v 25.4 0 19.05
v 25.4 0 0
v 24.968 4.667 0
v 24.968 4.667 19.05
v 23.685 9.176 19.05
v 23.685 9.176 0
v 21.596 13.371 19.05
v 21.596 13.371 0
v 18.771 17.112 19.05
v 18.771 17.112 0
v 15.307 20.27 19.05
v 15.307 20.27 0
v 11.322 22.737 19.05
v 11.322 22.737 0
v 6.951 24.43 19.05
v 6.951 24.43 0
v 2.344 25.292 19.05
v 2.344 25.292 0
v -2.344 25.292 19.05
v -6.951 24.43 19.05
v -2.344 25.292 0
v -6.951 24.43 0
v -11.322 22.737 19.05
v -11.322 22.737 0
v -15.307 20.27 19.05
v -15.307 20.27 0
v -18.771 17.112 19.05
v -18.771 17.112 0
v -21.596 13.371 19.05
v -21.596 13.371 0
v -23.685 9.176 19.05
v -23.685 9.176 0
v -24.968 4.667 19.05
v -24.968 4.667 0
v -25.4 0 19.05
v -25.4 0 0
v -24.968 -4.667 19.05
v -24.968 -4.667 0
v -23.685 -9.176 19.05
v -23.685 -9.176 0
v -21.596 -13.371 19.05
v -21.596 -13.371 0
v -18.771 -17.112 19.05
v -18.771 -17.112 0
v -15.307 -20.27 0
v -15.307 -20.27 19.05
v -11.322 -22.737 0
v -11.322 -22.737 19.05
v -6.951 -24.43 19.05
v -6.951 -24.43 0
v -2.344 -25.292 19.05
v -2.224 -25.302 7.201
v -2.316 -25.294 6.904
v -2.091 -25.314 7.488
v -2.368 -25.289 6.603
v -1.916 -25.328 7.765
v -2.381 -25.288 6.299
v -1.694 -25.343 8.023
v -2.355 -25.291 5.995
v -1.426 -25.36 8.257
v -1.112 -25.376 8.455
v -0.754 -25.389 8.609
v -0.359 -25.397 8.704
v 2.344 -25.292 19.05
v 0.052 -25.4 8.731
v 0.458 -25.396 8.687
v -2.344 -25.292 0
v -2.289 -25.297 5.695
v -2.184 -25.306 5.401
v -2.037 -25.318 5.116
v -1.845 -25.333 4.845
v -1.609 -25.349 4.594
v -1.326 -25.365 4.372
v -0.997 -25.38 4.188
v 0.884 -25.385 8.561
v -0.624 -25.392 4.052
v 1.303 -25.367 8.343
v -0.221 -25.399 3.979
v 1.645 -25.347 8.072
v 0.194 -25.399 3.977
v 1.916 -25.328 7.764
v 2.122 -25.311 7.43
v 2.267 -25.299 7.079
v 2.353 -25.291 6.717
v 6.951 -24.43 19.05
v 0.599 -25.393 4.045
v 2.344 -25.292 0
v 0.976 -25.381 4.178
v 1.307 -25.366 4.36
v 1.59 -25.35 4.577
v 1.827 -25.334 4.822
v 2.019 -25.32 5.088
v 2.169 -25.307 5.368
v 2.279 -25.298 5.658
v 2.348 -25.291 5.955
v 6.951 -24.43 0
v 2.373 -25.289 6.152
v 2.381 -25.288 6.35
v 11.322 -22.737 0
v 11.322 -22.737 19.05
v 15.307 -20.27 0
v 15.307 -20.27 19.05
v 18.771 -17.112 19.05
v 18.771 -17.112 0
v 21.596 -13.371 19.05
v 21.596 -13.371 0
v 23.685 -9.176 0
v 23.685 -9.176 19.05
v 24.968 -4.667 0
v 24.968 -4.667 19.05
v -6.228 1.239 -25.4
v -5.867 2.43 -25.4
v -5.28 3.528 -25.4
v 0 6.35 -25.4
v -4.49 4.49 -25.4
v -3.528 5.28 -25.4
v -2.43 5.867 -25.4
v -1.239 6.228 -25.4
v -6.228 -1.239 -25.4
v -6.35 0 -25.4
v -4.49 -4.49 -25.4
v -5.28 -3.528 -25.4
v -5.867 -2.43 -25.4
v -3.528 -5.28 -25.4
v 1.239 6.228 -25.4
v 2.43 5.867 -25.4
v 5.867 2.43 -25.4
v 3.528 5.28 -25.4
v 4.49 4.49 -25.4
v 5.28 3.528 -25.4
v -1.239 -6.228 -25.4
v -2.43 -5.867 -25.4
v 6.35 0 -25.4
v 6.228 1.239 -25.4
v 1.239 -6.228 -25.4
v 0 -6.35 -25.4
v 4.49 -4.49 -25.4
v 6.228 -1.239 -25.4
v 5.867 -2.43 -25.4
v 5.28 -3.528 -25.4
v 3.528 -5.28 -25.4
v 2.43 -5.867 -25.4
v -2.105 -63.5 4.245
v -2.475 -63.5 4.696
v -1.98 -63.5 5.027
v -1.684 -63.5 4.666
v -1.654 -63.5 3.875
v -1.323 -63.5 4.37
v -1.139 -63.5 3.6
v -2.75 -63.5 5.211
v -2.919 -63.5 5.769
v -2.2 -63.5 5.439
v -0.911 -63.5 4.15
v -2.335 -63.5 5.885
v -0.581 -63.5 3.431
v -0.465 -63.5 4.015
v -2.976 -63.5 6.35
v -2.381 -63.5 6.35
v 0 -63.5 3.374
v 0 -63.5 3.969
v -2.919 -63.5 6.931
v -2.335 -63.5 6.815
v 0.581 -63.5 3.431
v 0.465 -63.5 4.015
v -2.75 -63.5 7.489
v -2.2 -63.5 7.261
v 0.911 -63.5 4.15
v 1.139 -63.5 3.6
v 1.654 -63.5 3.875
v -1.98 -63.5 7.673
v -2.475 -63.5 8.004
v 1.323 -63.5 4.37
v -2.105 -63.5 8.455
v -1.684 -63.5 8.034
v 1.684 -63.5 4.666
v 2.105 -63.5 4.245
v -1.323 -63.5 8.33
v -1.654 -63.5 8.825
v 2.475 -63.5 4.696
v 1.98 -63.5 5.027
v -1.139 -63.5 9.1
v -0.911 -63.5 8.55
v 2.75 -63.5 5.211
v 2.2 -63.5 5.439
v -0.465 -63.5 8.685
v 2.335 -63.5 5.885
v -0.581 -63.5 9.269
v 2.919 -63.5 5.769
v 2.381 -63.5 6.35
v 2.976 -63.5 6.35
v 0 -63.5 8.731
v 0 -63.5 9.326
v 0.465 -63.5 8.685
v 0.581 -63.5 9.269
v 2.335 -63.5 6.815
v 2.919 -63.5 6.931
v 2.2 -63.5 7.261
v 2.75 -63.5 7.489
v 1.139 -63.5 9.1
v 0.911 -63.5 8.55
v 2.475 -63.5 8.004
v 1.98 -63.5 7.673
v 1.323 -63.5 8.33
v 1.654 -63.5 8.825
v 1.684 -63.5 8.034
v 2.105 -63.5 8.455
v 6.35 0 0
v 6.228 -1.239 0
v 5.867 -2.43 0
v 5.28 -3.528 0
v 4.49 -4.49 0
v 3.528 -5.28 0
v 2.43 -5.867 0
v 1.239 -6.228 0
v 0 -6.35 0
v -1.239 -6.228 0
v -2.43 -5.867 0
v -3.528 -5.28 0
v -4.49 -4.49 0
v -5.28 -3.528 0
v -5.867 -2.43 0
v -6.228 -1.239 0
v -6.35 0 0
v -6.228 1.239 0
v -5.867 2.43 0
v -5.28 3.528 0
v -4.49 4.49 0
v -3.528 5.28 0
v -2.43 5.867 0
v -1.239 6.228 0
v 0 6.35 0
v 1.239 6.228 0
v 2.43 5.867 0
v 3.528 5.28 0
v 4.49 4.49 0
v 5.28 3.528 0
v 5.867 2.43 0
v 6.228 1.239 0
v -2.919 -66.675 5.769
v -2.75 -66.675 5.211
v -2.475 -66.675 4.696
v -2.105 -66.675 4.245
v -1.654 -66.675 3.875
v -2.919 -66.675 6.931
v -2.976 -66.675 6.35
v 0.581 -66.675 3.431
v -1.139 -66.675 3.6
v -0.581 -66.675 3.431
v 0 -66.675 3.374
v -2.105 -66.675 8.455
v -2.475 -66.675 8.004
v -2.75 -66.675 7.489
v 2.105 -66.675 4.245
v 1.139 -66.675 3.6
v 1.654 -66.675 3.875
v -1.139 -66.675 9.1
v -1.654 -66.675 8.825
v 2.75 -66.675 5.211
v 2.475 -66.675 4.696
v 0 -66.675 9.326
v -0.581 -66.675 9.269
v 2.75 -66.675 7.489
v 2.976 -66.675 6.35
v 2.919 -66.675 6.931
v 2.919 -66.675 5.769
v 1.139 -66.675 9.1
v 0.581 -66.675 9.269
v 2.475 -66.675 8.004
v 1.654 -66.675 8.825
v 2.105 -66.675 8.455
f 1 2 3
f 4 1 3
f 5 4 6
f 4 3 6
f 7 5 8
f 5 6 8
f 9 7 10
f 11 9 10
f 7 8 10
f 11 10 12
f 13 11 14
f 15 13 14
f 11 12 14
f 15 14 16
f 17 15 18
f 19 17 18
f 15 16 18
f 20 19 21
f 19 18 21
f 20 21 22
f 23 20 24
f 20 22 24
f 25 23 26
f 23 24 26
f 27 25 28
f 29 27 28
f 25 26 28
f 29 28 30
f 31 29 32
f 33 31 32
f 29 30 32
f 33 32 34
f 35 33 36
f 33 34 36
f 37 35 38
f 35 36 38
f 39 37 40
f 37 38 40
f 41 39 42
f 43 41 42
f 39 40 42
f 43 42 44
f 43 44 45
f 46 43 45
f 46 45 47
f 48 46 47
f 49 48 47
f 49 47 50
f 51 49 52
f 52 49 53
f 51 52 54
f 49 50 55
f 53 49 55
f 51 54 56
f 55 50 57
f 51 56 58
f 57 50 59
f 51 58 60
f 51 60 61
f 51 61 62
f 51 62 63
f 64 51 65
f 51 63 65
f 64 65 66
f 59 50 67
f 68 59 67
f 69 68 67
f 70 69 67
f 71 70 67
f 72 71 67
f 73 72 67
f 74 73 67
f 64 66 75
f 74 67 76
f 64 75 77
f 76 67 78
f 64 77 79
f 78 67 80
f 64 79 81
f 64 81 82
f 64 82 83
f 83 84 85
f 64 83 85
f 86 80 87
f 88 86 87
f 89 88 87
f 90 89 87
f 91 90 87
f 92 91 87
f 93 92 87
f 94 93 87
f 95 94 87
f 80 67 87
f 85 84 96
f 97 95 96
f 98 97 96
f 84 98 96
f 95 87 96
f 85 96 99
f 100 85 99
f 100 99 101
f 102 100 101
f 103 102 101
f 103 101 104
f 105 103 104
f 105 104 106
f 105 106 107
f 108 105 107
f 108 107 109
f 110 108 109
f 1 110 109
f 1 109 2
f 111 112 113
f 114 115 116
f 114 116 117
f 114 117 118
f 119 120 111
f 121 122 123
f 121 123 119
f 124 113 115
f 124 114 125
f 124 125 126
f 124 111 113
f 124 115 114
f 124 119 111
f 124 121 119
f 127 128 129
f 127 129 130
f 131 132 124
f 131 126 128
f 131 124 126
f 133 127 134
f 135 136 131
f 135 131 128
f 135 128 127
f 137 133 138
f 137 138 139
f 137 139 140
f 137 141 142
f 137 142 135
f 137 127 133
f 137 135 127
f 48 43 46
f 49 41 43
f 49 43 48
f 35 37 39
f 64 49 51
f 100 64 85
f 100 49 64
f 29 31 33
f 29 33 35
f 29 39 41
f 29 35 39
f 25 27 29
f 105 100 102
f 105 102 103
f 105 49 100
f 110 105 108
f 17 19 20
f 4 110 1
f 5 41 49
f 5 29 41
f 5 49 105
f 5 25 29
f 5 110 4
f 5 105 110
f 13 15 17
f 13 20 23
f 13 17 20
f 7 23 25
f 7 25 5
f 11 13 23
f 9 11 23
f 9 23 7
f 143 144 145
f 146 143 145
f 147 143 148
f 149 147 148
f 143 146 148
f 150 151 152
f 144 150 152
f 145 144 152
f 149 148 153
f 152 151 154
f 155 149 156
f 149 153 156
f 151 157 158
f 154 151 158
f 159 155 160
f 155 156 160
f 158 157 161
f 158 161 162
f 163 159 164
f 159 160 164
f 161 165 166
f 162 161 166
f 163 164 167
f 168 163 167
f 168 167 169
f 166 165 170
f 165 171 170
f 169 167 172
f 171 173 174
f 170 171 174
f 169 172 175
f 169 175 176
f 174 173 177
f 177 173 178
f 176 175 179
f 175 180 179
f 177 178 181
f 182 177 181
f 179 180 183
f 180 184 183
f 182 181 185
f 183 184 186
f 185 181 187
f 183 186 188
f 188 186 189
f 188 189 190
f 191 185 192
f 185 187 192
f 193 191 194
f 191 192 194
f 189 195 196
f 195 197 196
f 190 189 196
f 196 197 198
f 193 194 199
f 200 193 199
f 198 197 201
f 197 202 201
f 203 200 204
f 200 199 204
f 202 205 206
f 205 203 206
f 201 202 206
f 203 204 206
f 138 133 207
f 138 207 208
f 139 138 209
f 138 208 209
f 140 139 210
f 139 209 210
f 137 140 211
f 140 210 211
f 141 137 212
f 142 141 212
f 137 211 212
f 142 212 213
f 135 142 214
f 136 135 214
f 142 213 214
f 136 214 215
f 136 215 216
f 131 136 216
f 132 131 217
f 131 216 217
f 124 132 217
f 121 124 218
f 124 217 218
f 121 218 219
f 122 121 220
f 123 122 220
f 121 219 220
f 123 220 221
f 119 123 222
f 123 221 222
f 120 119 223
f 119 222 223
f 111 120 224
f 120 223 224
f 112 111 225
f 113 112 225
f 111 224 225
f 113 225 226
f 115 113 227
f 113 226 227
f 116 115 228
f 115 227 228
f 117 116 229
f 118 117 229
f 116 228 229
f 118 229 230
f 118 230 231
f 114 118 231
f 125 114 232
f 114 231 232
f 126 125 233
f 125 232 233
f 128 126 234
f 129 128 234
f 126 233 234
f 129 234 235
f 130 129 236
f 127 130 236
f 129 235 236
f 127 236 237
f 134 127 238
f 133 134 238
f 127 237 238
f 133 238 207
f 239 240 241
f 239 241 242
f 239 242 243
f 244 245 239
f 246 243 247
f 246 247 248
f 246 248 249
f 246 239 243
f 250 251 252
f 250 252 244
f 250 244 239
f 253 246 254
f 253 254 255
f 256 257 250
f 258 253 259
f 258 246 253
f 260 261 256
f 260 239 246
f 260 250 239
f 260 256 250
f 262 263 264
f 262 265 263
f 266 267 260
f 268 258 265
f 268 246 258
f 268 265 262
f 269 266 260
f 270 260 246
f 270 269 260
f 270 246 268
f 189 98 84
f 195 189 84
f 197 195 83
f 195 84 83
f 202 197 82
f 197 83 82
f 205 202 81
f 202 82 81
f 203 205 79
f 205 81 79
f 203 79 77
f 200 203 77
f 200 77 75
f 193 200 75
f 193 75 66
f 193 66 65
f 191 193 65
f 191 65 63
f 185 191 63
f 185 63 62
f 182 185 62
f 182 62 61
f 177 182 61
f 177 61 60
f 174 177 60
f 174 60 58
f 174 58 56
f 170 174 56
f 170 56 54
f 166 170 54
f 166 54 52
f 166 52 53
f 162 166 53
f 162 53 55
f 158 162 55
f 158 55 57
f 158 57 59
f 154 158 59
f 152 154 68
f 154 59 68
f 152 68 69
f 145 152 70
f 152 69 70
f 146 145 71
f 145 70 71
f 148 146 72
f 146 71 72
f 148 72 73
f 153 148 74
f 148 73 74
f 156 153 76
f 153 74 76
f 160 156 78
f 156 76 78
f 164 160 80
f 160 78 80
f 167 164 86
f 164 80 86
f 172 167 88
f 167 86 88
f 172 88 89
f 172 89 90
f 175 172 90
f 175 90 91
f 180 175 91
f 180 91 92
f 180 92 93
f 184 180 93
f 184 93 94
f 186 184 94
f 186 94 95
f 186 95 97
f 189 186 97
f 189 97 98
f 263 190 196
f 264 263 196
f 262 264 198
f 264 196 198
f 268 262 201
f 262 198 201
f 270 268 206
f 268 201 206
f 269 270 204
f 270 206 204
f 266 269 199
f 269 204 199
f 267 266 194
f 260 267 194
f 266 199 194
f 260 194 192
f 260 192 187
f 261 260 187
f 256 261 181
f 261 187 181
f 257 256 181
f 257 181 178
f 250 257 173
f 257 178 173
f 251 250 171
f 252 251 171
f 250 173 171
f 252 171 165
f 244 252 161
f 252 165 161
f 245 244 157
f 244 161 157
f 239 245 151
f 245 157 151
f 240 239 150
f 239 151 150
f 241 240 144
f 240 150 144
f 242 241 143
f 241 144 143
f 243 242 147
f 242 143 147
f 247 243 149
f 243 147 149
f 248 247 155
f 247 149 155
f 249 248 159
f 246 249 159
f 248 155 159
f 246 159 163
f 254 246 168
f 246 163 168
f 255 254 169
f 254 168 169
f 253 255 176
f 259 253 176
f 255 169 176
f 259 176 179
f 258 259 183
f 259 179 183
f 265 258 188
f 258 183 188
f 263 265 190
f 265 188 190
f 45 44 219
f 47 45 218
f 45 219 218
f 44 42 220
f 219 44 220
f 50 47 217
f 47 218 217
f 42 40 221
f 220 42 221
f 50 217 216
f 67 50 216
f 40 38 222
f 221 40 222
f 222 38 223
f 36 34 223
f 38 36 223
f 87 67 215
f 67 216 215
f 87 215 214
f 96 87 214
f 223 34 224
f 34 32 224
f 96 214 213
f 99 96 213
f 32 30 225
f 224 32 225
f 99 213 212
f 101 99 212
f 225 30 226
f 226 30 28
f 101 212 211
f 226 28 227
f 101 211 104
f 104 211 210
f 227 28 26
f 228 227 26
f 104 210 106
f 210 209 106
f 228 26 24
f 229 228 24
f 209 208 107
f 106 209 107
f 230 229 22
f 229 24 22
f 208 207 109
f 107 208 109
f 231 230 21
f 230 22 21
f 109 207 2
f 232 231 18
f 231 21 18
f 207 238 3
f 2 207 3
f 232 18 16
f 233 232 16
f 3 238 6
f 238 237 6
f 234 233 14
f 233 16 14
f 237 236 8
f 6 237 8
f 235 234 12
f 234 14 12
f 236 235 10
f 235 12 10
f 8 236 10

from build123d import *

# Parameters (mm, degrees)
F0_R      = 25.4
F1_DEPTH  = 19.05
F2_R      = 25.4
F2_R_2    = 22.225
F3_DEPTH  = 3.175
F4_R      = 2.38125
F5_DEPTH  = 63.5
F6_R      = 2.9763912457
F6_R_2    = 2.38125
F7_DEPTH  = 3.175
F8_R      = 22.6060003042
F9_DEPTH  = 3.175
F10_R     = 6.35
F11_DEPTH = 25.4


with BuildPart() as f1:
    # F0 (on Top) → F1 (new body)
    with BuildSketch(Plane.XY):
        Circle(F0_R)
    extrude(amount=F1_DEPTH)

    # F2 (on face) → F3 (join)
    with BuildSketch(Plane.XY.offset(19.05)):
        Circle(F2_R)
        Circle(F2_R_2, mode=Mode.SUBTRACT)
    extrude(amount=-F3_DEPTH)

    # F4 (on Front) → F5 (join)
    with BuildSketch(Plane.XZ):
        with Locations((0, 6.35)):
            Circle(F4_R)
    extrude(amount=F5_DEPTH)

    # F6 (on face) → F7 (join)
    with BuildSketch(Plane.XZ.offset(63.5)):
        with Locations((0, 6.35)):
            Circle(F6_R)
        with Locations((0, 6.35)):
            Circle(F6_R_2, mode=Mode.SUBTRACT)
        with Locations((0, 6.35)):
            Circle(F6_R_2)
    extrude(amount=F7_DEPTH)

    # F8 (on face) → F9 (join)
    with BuildSketch(Plane.XY.offset(19.05)):
        Circle(F8_R)
    extrude(amount=-F9_DEPTH)

    # F10 (on face) → F11 (join)
    with BuildSketch(Plane(origin=(0, 0, 0), x_dir=(1, 0, 0), z_dir=(0, 0, -1))):
        Circle(F10_R)
    extrude(amount=F11_DEPTH)


solid = f1.part
